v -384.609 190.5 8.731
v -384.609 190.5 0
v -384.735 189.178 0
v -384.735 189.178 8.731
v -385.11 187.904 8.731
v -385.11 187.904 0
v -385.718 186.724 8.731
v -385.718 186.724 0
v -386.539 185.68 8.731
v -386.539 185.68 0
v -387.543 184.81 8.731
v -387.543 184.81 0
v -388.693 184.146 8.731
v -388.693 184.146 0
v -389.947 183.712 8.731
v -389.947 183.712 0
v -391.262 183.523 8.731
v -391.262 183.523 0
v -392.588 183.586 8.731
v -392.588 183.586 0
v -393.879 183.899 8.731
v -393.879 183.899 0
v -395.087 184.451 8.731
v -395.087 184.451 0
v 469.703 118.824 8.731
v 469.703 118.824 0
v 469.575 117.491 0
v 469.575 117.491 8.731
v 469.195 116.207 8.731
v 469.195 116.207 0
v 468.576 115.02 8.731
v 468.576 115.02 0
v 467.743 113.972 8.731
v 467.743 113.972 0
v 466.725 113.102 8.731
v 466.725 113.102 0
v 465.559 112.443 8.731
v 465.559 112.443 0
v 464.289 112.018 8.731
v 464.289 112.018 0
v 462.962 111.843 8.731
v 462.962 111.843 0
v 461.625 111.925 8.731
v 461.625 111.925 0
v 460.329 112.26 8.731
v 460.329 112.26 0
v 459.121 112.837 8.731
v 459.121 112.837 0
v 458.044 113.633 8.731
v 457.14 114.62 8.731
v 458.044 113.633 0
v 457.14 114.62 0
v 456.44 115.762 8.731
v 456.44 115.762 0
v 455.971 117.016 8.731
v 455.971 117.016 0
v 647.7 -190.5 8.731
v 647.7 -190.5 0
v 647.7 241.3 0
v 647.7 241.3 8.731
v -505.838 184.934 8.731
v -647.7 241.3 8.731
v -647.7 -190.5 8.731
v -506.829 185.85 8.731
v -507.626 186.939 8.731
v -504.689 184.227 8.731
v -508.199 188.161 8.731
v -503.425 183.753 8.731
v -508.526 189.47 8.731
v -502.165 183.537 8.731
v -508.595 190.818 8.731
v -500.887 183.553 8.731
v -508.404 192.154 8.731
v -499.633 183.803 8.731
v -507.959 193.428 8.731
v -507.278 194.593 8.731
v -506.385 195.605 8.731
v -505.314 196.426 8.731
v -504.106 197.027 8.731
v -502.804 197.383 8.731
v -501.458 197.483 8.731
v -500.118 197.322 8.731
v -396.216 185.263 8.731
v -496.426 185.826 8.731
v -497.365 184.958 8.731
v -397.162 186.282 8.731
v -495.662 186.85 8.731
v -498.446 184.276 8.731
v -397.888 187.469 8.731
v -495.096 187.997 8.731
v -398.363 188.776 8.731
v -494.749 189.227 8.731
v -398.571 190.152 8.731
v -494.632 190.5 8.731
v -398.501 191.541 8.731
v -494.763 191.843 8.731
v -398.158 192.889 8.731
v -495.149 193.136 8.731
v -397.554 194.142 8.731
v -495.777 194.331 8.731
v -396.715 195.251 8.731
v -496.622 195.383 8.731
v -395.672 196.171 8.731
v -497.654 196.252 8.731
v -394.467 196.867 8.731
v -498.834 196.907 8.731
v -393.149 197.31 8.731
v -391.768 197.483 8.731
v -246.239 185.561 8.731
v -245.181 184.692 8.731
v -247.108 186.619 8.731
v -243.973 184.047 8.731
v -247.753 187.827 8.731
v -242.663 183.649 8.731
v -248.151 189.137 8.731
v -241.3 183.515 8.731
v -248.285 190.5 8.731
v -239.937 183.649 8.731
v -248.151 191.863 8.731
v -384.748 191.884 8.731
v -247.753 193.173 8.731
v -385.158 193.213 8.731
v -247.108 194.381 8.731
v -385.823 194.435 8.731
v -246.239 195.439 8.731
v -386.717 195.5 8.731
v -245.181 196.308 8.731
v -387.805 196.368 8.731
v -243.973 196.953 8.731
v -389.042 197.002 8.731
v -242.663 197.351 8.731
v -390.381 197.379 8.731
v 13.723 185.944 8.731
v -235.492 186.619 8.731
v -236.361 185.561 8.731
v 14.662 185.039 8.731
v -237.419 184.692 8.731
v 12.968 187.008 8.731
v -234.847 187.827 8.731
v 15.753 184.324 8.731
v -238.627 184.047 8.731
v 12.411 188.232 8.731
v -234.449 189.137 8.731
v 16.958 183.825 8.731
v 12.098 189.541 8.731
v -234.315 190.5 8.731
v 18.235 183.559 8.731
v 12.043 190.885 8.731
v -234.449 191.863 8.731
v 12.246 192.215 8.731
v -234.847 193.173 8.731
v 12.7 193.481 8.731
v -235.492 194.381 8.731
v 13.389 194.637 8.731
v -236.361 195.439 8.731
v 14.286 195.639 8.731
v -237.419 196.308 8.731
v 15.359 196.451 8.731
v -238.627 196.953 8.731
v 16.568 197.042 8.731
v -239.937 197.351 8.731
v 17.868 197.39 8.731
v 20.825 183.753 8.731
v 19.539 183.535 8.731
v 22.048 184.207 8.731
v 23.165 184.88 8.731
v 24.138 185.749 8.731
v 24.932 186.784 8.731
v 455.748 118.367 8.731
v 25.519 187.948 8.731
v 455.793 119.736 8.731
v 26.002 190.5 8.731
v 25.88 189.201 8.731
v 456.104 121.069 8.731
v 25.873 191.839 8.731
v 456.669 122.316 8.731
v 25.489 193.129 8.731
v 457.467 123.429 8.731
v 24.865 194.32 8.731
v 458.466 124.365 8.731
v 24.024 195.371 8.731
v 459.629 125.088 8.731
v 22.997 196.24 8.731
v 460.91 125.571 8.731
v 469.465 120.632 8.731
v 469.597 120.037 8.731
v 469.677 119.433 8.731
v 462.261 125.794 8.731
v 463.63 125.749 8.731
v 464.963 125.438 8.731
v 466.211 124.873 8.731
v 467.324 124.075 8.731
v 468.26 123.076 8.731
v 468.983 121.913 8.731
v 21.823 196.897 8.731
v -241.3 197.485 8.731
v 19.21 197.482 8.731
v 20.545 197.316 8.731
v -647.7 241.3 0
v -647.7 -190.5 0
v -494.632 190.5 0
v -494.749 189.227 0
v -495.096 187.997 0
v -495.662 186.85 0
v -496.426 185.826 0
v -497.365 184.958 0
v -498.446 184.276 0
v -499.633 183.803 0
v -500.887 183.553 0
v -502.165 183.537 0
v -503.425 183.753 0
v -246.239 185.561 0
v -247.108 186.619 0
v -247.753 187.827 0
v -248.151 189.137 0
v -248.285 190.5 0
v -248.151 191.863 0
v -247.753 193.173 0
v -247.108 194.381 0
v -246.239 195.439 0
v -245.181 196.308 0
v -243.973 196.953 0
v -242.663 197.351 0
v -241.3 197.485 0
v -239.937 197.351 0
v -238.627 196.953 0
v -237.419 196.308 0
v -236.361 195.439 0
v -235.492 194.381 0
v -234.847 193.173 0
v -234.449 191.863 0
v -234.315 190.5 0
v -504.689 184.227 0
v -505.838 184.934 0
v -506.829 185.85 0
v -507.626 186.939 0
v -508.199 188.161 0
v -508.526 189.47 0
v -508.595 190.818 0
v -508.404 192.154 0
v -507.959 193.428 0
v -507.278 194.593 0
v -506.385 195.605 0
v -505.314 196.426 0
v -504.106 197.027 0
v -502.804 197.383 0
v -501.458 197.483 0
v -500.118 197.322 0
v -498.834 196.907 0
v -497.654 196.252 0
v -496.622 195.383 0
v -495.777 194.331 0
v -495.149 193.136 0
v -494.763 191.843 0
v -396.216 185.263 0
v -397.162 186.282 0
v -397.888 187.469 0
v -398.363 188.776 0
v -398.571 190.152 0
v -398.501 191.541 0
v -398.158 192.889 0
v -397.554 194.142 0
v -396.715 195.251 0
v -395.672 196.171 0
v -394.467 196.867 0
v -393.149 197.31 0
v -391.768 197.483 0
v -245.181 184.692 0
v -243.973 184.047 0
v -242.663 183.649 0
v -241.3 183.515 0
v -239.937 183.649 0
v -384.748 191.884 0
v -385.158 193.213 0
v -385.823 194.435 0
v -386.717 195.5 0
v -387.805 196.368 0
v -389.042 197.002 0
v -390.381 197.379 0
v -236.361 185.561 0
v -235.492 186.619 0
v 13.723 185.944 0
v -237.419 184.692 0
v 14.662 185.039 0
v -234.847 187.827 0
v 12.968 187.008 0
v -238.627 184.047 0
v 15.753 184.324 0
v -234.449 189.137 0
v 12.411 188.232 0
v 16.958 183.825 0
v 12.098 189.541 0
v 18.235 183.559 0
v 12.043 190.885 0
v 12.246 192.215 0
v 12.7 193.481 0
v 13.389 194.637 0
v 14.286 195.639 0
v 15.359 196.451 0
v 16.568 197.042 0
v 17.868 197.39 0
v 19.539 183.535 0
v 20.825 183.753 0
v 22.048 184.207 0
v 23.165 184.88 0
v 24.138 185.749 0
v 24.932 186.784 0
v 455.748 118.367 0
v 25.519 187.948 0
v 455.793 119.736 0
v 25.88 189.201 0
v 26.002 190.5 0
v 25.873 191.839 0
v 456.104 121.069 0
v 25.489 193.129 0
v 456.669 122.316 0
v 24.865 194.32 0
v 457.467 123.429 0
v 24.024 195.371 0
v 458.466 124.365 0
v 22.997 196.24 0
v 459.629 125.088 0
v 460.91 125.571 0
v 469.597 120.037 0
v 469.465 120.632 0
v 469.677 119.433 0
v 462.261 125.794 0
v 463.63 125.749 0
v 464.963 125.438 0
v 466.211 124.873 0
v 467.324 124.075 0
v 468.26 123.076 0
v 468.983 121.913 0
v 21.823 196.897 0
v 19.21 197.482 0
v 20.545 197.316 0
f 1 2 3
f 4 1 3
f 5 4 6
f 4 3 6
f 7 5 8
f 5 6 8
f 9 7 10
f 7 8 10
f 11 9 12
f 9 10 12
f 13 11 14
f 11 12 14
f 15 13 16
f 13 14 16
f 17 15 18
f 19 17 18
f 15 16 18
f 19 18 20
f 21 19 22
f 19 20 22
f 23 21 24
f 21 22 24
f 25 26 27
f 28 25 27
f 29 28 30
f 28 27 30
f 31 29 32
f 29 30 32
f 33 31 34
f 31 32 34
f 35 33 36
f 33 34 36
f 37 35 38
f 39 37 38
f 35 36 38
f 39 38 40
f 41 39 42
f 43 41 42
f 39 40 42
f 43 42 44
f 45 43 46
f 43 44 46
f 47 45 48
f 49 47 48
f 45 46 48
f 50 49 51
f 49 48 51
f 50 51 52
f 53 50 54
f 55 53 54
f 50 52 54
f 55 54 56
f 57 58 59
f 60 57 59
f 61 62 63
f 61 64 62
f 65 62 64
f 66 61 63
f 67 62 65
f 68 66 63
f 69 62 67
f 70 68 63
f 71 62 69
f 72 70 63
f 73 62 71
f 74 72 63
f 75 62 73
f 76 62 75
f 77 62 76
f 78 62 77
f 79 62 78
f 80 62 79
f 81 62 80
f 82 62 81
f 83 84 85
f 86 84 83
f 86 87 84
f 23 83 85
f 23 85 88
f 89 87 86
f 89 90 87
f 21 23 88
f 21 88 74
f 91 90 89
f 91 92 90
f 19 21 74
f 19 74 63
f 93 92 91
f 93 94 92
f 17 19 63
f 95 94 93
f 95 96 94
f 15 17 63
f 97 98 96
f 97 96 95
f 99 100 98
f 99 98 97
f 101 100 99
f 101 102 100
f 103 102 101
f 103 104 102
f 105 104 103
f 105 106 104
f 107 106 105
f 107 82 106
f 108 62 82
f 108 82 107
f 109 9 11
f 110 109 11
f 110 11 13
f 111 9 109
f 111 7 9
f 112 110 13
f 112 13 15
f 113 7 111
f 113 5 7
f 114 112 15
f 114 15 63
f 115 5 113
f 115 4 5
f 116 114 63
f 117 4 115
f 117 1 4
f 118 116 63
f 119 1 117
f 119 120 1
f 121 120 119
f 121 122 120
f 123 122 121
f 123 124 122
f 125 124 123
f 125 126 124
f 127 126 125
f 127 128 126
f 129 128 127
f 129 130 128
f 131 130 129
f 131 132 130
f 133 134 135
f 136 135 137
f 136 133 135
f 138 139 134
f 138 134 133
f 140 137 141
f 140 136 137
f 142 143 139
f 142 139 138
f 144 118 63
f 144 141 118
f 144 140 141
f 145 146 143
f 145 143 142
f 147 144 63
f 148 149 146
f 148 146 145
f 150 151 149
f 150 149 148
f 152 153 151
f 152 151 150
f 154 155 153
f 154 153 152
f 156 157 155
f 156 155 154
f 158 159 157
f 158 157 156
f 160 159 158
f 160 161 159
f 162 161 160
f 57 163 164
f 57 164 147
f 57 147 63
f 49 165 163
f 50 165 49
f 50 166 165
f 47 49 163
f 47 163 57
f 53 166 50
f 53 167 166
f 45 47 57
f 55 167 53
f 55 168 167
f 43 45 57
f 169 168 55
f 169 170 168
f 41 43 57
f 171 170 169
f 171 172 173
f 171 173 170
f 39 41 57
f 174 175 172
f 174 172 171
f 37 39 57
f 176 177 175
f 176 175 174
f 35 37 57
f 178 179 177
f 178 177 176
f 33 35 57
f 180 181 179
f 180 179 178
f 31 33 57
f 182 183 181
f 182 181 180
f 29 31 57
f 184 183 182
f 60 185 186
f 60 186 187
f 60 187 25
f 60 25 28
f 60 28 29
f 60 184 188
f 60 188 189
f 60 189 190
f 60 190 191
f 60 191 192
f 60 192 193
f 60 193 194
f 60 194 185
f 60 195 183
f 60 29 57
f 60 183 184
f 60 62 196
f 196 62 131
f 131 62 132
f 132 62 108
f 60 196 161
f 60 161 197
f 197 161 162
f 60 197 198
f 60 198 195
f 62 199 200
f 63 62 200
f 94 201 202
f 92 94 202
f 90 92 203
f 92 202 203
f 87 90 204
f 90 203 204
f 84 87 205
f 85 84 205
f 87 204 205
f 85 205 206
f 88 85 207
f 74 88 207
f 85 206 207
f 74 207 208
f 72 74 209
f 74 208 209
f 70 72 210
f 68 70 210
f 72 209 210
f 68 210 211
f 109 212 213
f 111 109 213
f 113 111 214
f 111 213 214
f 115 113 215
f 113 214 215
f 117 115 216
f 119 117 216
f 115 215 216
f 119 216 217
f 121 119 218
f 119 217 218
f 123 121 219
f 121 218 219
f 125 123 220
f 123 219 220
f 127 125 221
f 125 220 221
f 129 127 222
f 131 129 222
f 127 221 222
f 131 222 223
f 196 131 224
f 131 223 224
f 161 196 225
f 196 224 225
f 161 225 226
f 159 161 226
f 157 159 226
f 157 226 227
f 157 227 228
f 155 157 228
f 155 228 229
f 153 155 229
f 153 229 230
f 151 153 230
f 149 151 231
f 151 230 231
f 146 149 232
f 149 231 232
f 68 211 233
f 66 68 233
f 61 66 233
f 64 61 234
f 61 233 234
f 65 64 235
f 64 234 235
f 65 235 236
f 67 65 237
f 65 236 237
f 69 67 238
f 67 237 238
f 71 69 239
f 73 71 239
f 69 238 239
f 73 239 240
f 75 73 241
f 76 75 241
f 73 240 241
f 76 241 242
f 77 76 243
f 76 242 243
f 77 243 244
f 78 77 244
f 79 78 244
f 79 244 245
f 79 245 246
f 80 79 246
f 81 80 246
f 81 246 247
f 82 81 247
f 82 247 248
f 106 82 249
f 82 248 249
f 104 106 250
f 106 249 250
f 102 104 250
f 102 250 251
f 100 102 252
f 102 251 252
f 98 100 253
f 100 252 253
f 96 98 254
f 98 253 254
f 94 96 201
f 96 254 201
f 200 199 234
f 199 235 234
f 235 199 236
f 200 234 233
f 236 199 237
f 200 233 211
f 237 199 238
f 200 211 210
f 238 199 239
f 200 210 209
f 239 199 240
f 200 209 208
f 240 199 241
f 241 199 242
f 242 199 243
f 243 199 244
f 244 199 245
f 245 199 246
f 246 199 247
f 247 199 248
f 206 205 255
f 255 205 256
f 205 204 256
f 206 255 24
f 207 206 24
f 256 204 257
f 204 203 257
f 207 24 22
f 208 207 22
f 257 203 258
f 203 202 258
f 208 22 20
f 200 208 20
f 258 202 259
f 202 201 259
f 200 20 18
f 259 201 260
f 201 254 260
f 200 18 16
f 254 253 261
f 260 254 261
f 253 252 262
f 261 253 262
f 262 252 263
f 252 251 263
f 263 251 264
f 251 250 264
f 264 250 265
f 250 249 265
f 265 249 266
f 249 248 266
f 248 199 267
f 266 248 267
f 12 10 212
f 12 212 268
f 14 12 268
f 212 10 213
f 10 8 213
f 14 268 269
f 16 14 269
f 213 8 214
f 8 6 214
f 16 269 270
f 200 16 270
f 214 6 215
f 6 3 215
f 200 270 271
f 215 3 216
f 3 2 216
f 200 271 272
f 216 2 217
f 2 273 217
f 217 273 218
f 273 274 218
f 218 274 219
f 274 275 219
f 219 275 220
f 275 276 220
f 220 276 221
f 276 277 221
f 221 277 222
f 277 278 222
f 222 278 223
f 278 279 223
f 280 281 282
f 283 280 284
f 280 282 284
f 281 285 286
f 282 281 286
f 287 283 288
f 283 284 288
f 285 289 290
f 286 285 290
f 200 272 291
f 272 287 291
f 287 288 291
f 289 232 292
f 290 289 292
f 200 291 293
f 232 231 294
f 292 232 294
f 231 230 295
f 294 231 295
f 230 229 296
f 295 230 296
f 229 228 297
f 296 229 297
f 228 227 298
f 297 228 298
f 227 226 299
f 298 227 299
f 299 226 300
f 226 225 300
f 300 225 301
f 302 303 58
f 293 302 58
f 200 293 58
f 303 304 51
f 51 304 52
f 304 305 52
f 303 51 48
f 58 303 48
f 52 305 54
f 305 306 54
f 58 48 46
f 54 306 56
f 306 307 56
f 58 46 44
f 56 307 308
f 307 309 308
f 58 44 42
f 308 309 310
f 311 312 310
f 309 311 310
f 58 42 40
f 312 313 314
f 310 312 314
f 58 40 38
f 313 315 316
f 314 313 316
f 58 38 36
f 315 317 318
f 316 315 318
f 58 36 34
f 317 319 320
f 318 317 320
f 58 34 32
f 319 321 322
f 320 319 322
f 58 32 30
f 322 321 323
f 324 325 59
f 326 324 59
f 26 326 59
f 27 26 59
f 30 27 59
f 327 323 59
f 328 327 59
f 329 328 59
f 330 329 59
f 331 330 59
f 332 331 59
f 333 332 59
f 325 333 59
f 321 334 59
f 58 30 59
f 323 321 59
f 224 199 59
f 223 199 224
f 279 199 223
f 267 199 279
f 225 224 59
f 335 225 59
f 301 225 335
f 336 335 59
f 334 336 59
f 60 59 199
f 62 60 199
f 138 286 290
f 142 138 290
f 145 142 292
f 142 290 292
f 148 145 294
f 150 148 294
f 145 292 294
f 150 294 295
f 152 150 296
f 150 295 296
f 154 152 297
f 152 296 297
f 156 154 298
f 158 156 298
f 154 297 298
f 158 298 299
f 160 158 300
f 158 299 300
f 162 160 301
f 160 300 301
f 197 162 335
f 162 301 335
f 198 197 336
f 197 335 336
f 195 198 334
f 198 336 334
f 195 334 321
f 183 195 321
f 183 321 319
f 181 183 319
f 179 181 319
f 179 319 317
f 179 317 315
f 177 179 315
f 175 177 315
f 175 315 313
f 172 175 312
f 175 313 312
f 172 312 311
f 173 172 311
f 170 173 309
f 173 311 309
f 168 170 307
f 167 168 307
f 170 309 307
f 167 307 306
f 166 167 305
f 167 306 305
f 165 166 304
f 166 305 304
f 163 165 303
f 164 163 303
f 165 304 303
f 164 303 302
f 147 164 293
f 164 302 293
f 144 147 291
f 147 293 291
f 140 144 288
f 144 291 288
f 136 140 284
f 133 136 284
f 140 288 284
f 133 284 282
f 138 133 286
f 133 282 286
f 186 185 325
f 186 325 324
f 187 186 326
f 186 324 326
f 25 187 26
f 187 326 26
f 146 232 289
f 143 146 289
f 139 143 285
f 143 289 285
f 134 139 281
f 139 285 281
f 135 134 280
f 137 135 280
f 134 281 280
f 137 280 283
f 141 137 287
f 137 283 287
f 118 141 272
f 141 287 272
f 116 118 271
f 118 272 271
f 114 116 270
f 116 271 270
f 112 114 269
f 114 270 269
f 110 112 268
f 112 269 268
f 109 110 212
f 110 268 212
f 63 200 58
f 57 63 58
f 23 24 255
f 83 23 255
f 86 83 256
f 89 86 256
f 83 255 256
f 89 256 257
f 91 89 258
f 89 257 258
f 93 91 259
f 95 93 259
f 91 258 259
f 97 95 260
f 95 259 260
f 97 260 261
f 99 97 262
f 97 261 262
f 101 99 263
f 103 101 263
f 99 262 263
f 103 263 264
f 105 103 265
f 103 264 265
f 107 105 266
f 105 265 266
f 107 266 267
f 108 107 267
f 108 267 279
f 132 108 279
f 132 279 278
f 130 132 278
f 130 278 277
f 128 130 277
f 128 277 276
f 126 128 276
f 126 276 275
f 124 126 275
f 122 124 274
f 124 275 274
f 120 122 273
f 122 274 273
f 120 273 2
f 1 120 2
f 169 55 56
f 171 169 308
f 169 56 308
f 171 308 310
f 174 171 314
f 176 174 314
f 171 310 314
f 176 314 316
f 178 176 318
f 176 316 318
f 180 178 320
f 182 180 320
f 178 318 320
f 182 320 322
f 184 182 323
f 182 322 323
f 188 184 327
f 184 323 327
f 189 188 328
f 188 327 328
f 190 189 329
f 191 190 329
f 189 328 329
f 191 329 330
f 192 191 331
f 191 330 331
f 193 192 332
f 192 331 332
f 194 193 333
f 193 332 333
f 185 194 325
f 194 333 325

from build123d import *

# Parameters (mm, degrees)
F0_W     = 50.8
F0_H     = 25.4
F1_DEPTH = 8.73125


with BuildPart() as f1:
    # F0 (on Top) → F1 (new body)
    with BuildSketch(Plane.XY):
        with BuildLine():
            Line((-596.9, -190.5), (647.7, -190.5))
            Line((647.7, -190.5), (647.7, 168.389565))
            Line((647.7, 168.389565), (469.465175, 120.631687))
            ThreePointArc((469.465175, 120.631687), (469.643426, 119.735562), (469.703183, 118.823836))
            ThreePointArc((469.703183, 118.823836), (463.629909, 111.898594), (455.971191, 117.015985))
            Line((455.971191, 117.015985), (-596.9, -165.1))
            Line((-596.9, -165.1), (-596.9, -190.5))
        make_face()
        with Locations((-622.3, -177.8)):
            Rectangle(F0_W, F0_H)
        with BuildLine():
            ThreePointArc((-494.632267, 190.5), (-505.869466, 196.041573), (-503.425118, 183.753008))
            ThreePointArc((-503.425118, 183.753008), (-497.365069, 184.958427), (-494.632267, 190.5))
        make_face()
        with BuildLine():
            ThreePointArc((-384.609244, 190.5), (-395.086744, 196.549187), (-395.086744, 184.450813))
            ThreePointArc((-395.086744, 184.450813), (-388.101744, 184.450813), (-384.609244, 190.5))
        make_face()
        with BuildLine():
            ThreePointArc((-234.315, 190.5), (-243.973044, 196.953299), (-246.239141, 185.560859))
            ThreePointArc((-246.239141, 185.560859), (-238.626956, 184.046701), (-234.315, 190.5))
        make_face()
        with BuildLine():
            ThreePointArc((26.002267, 190.5), (17.209416, 197.246992), (12.96808, 187.0075))
            ThreePointArc((12.96808, 187.0075), (20.825118, 183.753008), (26.002267, 190.5))
        make_face()
        with BuildLine():
            Line((469.465175, 120.631687), (647.7, 168.389565))
            Line((647.7, 168.389565), (647.7, 190.5))
            Line((647.7, 190.5), (647.7, 241.3))
            Line((647.7, 241.3), (-647.7, 241.3))
            Line((-647.7, 241.3), (-647.7, 190.5))
            Line((-647.7, 190.5), (-647.7, -165.1))
            Line((-647.7, -165.1), (-596.9, -165.1))
            Line((-596.9, -165.1), (455.971191, 117.015985))
            ThreePointArc((455.971191, 117.015985), (460.910332, 125.570828), (469.465175, 120.631687))
        make_face()
        with BuildLine():
            ThreePointArc((-494.632267, 190.5), (-497.365069, 184.958427), (-503.425118, 183.753008))
            ThreePointArc((-503.425118, 183.753008), (-505.869466, 196.041573), (-494.632267, 190.5))
        make_face(mode=Mode.SUBTRACT)
        with BuildLine():
            ThreePointArc((-384.609244, 190.5), (-388.101744, 184.450813), (-395.086744, 184.450813))
            ThreePointArc((-395.086744, 184.450813), (-395.086744, 196.549187), (-384.609244, 190.5))
        make_face(mode=Mode.SUBTRACT)
        with BuildLine():
            ThreePointArc((-234.315, 190.5), (-238.626956, 184.046701), (-246.239141, 185.560859))
            ThreePointArc((-246.239141, 185.560859), (-243.973044, 196.953299), (-234.315, 190.5))
        make_face(mode=Mode.SUBTRACT)
        with BuildLine():
            ThreePointArc((26.002267, 190.5), (20.825118, 183.753008), (12.96808, 187.0075))
            ThreePointArc((12.96808, 187.0075), (17.209416, 197.246992), (26.002267, 190.5))
        make_face(mode=Mode.SUBTRACT)
    extrude(amount=F1_DEPTH)


solid = f1.part
